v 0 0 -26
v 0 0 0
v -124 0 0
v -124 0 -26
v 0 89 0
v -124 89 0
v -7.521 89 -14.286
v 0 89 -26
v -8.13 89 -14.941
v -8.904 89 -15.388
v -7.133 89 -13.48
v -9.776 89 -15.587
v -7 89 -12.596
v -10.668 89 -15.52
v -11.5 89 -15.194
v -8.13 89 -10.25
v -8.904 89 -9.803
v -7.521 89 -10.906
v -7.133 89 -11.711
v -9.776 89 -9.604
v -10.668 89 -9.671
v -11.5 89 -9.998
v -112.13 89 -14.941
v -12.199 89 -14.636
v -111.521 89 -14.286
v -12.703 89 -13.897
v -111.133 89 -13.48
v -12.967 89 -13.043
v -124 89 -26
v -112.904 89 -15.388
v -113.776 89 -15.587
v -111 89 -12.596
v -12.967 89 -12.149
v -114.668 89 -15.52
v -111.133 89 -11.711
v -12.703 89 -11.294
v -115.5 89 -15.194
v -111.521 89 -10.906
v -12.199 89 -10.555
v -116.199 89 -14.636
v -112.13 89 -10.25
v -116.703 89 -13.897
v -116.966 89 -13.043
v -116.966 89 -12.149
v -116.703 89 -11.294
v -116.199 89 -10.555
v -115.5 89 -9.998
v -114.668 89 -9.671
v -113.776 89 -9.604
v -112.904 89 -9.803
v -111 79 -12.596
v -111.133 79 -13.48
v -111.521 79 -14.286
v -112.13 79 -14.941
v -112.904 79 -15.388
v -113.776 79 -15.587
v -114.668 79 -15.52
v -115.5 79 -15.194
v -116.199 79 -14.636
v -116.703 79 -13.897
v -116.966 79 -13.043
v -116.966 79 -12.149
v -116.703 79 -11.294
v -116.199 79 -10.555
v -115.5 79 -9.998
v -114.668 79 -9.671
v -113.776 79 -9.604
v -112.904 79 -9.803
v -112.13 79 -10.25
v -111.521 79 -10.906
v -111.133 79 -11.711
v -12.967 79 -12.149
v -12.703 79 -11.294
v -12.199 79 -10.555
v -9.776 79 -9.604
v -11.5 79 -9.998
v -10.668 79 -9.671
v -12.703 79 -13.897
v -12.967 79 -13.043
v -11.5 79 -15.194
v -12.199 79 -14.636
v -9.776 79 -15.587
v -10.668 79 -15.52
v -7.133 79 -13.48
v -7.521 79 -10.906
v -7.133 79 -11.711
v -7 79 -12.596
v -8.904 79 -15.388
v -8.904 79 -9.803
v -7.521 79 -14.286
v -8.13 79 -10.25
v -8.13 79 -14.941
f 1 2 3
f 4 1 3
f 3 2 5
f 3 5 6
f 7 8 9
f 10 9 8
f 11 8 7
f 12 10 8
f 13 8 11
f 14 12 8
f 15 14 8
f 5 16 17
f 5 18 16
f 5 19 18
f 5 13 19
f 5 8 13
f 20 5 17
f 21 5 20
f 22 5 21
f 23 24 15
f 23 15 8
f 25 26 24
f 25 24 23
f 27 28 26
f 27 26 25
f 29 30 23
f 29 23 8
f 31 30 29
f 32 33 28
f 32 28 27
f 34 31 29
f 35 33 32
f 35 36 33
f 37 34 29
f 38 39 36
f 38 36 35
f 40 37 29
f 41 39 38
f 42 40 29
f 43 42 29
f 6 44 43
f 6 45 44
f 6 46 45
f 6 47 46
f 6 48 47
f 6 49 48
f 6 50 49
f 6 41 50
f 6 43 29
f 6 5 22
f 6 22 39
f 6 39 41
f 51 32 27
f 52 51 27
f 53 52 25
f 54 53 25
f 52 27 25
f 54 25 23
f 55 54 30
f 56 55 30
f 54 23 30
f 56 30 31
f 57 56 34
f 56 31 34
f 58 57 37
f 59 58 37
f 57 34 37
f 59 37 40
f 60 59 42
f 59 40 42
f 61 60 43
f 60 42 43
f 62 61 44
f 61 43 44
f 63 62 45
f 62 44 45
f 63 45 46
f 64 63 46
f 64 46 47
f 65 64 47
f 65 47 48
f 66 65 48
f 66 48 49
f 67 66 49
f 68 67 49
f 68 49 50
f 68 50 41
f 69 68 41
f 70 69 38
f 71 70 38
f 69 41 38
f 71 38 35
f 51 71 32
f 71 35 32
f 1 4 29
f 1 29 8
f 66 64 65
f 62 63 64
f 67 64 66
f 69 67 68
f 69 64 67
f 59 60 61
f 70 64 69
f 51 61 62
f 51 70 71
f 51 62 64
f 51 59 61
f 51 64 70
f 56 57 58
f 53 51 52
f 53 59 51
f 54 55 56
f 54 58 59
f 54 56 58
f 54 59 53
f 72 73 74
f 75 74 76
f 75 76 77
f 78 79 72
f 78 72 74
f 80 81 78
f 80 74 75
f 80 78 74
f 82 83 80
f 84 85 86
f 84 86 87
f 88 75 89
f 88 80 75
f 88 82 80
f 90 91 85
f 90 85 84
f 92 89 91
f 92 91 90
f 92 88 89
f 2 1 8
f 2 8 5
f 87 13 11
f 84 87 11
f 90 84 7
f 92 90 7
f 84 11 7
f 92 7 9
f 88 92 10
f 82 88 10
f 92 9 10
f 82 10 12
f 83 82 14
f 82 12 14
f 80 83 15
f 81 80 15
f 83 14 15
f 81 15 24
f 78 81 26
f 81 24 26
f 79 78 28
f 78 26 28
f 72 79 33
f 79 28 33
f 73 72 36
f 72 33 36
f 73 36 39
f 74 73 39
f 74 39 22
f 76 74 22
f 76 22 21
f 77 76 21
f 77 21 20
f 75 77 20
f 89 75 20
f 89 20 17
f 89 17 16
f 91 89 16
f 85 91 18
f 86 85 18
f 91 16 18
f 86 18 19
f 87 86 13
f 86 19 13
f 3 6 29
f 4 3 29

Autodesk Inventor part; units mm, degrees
ref_plane "YZ Plane" through (0, 0, 0) normal (1, 0, 0) x (0, 1, 0)
ref_plane "XZ Plane" through (0, 0, 0) normal (0, 1, 0) x (-1, 0, 0)
ref_plane "XY Plane" through (0, 0, 0) normal (0, 0, 1) x (1, 0, 0)
sketch "Sketch1" plane through (0, 0, 0) normal (0, 1, 0) x (-1, 0, 0)
  line L0 (0, 0) -> (124, 0)
  line L1 (124, 0) -> (124, -26)
  line L2 (124, -26) -> (0, -26)
  line L3 (0, -26) -> (0, 0)
  circle A0 centre (10.0002, -12.5957) radius 3
  circle A1 centre (114, -12.5957) radius 3
  line L4 (0, 0) -> (124.0002, 0)
  line L5 (124.0002, 0) -> (124.0002, -2.5957)
  line L6 (124.0002, -2.5957) -> (117, -2.5957)
  line L7 (117, -2.5957) -> (117, -5.5957)
  line L8 (117, -5.5957) -> (124.0002, -5.5957)
  line L9 (124.0002, -5.5957) -> (124.0002, -19.5957)
  line L10 (124.0002, -19.5957) -> (117, -19.5957)
  line L11 (117, -19.5957) -> (117, -22.5957)
  line L12 (117, -22.5957) -> (124.0002, -22.5957)
  line L13 (124.0002, -22.5957) -> (124.0002, -26)
  line L14 (124.0002, -26) -> (0, -26)
  line L15 (0, -26) -> (0, -22.5957)
  line L16 (0, -22.5957) -> (7, -22.5957)
  line L17 (7, -22.5957) -> (7, -19.5957)
  line L18 (7, -19.5957) -> (0, -19.5957)
  line L19 (0, -19.5957) -> (0, -5.5957)
  line L20 (0, -5.5957) -> (7, -5.5957)
  line L21 (7, -5.5957) -> (7, -2.5957)
  line L22 (7, -2.5957) -> (0, -2.5957)
  line L23 (0, -2.5957) -> (0, 0)
  line L24 (31.0002, -9.0957) -> (28.0002, -9.0957)
  line L25 (28.0002, -9.0957) -> (28.0002, -16.0957)
  line L26 (28.0002, -16.0957) -> (31.0002, -16.0957)
  line L27 (31.0002, -16.0957) -> (31.0002, -9.0957)
  line L28 (31.0002, -5.5957) -> (22, -5.5957)
  line L29 (22, -5.5957) -> (22, -2.5957)
  line L30 (22, -2.5957) -> (54.5, -2.5957)
  line L31 (54.5, -2.5957) -> (54.5, -5.5957)
  line L32 (54.5, -5.5957) -> (31.0002, -5.5957)
  line L33 (28.0002, -19.5957) -> (54.5, -19.5957)
  line L34 (54.5, -19.5957) -> (54.5, -22.5957)
  line L35 (54.5, -22.5957) -> (22, -22.5957)
  line L36 (22, -22.5957) -> (22, -19.5957)
  line L37 (22, -19.5957) -> (28.0002, -19.5957)
  line L38 (69.5, -5.5957) -> (69.5, -2.5957)
  line L39 (69.5, -2.5957) -> (102, -2.5957)
  line L40 (102, -2.5957) -> (102, -5.5957)
  line L41 (102, -5.5957) -> (69.5, -5.5957)
  line L42 (93, -9.0957) -> (96, -9.0957)
  line L43 (96, -9.0957) -> (96, -16.0957)
  line L44 (96, -16.0957) -> (93, -16.0957)
  line L45 (93, -16.0957) -> (93, -9.0957)
  line L46 (96, -19.5957) -> (69.5, -19.5957)
  line L47 (69.5, -19.5957) -> (69.5, -22.5957)
  line L48 (69.5, -22.5957) -> (102, -22.5957)
  line L49 (102, -22.5957) -> (102, -19.5957)
  line L50 (102, -19.5957) -> (96, -19.5957)
  dimension "d0" = 124
  dimension "d1" = 26
  dimension "d4" = 124.0002
  dimension "d5" = 26
extrude "Extrusion1" add sketch "Sketch1" along normal blind 89 contours L0 L1 L6 L7 L8 L10 L11 L12 L2 L3 L16 L17 L18 L20 L21 L22 | L22 L21 L20 L3 | L1 L8 L7 L6 | L18 L17 L16 L3 | L1 L12 L11 L10 | A0 | A1 | L27 L26 L25 L24 | L28 L29 L30 L31 L32 | L33 L34 L35 L36 L37 | L38 L39 L40 L41 | L42 L43 L44 L45 | L50 L49 L48 L47 L46
sketch "Sketch2" plane through (0, 89, 0) normal (0, 1, 0) x (1, 0, 0)
  line L0 (0, 0) -> (-124, 0)
  line L1 (-124, 0) -> (-124, 26)
  line L2 (-124, 26) -> (0, 26)
  line L3 (0, 26) -> (0, 0)
  line L4 (-28.0002, 16.0957) -> (-31.0002, 16.0957)
  line L5 (-31.0002, 16.0957) -> (-31.0002, 9.0957)
  line L6 (-31.0002, 9.0957) -> (-28.0002, 9.0957)
  line L7 (-31.0002, 5.5957) -> (-22, 5.5957)
  circle A0 centre (-10.0002, 12.5957) radius 3
  line L8 (-54.5, 2.5957) -> (-54.5, 5.5957)
  line L9 (-22, 2.5957) -> (-54.5, 2.5957)
  line L10 (-69.5, 5.5957) -> (-69.5, 2.5957)
  circle A1 centre (-114, 12.5957) radius 3
  line L11 (0, 0) -> (-124.0002, 0)
  line L12 (-124.0002, 26) -> (0, 26)
  line L13 (-117, 5.5957) -> (-124.0002, 5.5957)
  line L14 (-117, 19.5957) -> (-117, 22.5957)
  line L15 (-124.0002, 5.5957) -> (-124.0002, 19.5957)
  line L16 (-124.0002, 19.5957) -> (-117, 19.5957)
  line L17 (-117, 2.5957) -> (-117, 5.5957)
  line L18 (-124.0002, 2.5957) -> (-117, 2.5957)
  line L19 (-124.0002, 0) -> (-124.0002, 2.5957)
  line L20 (-124.0002, 22.5957) -> (-124.0002, 26)
  line L21 (-117, 22.5957) -> (-124.0002, 22.5957)
  line L22 (-102, 19.5957) -> (-96, 19.5957)
  line L23 (-102, 22.5957) -> (-102, 19.5957)
  line L24 (-96, 16.0957) -> (-93, 16.0957)
  line L25 (-93, 16.0957) -> (-93, 9.0957)
  line L26 (-93, 9.0957) -> (-96, 9.0957)
  line L27 (-96, 9.0957) -> (-96, 16.0957)
  line L28 (-96, 19.5957) -> (-69.5, 19.5957)
  line L29 (-69.5, 2.5957) -> (-102, 2.5957)
  line L30 (-102, 2.5957) -> (-102, 5.5957)
  line L31 (-102, 5.5957) -> (-69.5, 5.5957)
  line L32 (-69.5, 22.5957) -> (-102, 22.5957)
  line L33 (-69.5, 19.5957) -> (-69.5, 22.5957)
  line L34 (-54.5, 5.5957) -> (-31.0002, 5.5957)
  line L35 (-28.0002, 9.0957) -> (-28.0002, 16.0957)
  line L36 (-54.5, 22.5957) -> (-22, 22.5957)
  line L37 (-28.0002, 19.5957) -> (-54.5, 19.5957)
  line L38 (-54.5, 19.5957) -> (-54.5, 22.5957)
  line L39 (-22, 19.5957) -> (-28.0002, 19.5957)
  line L40 (-22, 22.5957) -> (-22, 19.5957)
  line L41 (-22, 5.5957) -> (-22, 2.5957)
  line L42 (0, 26) -> (0, 22.5957)
  line L43 (0, 22.5957) -> (-7, 22.5957)
  line L44 (-7, 22.5957) -> (-7, 19.5957)
  line L45 (-7, 19.5957) -> (0, 19.5957)
  line L46 (0, 19.5957) -> (0, 5.5957)
  line L47 (0, 5.5957) -> (-7, 5.5957)
  line L48 (-7, 2.5957) -> (0, 2.5957)
  line L49 (0, 2.5957) -> (0, 0)
  line L50 (-7, 5.5957) -> (-7, 2.5957)
  dimension "d6" = 124
  dimension "d7" = 26
  dimension "d8" = 124.0002
  dimension "d9" = 26
extrude "Extrusion2" cut sketch "Sketch2" against normal blind 10 contours A0 | A1
thread "Thread1" size "M6x1" class "6H" standard "ANSI Metric M Profile" full length
thread "Thread2" size "M6x1" class "6H" standard "ANSI Metric M Profile" full length
properties part number "base_soportes"
